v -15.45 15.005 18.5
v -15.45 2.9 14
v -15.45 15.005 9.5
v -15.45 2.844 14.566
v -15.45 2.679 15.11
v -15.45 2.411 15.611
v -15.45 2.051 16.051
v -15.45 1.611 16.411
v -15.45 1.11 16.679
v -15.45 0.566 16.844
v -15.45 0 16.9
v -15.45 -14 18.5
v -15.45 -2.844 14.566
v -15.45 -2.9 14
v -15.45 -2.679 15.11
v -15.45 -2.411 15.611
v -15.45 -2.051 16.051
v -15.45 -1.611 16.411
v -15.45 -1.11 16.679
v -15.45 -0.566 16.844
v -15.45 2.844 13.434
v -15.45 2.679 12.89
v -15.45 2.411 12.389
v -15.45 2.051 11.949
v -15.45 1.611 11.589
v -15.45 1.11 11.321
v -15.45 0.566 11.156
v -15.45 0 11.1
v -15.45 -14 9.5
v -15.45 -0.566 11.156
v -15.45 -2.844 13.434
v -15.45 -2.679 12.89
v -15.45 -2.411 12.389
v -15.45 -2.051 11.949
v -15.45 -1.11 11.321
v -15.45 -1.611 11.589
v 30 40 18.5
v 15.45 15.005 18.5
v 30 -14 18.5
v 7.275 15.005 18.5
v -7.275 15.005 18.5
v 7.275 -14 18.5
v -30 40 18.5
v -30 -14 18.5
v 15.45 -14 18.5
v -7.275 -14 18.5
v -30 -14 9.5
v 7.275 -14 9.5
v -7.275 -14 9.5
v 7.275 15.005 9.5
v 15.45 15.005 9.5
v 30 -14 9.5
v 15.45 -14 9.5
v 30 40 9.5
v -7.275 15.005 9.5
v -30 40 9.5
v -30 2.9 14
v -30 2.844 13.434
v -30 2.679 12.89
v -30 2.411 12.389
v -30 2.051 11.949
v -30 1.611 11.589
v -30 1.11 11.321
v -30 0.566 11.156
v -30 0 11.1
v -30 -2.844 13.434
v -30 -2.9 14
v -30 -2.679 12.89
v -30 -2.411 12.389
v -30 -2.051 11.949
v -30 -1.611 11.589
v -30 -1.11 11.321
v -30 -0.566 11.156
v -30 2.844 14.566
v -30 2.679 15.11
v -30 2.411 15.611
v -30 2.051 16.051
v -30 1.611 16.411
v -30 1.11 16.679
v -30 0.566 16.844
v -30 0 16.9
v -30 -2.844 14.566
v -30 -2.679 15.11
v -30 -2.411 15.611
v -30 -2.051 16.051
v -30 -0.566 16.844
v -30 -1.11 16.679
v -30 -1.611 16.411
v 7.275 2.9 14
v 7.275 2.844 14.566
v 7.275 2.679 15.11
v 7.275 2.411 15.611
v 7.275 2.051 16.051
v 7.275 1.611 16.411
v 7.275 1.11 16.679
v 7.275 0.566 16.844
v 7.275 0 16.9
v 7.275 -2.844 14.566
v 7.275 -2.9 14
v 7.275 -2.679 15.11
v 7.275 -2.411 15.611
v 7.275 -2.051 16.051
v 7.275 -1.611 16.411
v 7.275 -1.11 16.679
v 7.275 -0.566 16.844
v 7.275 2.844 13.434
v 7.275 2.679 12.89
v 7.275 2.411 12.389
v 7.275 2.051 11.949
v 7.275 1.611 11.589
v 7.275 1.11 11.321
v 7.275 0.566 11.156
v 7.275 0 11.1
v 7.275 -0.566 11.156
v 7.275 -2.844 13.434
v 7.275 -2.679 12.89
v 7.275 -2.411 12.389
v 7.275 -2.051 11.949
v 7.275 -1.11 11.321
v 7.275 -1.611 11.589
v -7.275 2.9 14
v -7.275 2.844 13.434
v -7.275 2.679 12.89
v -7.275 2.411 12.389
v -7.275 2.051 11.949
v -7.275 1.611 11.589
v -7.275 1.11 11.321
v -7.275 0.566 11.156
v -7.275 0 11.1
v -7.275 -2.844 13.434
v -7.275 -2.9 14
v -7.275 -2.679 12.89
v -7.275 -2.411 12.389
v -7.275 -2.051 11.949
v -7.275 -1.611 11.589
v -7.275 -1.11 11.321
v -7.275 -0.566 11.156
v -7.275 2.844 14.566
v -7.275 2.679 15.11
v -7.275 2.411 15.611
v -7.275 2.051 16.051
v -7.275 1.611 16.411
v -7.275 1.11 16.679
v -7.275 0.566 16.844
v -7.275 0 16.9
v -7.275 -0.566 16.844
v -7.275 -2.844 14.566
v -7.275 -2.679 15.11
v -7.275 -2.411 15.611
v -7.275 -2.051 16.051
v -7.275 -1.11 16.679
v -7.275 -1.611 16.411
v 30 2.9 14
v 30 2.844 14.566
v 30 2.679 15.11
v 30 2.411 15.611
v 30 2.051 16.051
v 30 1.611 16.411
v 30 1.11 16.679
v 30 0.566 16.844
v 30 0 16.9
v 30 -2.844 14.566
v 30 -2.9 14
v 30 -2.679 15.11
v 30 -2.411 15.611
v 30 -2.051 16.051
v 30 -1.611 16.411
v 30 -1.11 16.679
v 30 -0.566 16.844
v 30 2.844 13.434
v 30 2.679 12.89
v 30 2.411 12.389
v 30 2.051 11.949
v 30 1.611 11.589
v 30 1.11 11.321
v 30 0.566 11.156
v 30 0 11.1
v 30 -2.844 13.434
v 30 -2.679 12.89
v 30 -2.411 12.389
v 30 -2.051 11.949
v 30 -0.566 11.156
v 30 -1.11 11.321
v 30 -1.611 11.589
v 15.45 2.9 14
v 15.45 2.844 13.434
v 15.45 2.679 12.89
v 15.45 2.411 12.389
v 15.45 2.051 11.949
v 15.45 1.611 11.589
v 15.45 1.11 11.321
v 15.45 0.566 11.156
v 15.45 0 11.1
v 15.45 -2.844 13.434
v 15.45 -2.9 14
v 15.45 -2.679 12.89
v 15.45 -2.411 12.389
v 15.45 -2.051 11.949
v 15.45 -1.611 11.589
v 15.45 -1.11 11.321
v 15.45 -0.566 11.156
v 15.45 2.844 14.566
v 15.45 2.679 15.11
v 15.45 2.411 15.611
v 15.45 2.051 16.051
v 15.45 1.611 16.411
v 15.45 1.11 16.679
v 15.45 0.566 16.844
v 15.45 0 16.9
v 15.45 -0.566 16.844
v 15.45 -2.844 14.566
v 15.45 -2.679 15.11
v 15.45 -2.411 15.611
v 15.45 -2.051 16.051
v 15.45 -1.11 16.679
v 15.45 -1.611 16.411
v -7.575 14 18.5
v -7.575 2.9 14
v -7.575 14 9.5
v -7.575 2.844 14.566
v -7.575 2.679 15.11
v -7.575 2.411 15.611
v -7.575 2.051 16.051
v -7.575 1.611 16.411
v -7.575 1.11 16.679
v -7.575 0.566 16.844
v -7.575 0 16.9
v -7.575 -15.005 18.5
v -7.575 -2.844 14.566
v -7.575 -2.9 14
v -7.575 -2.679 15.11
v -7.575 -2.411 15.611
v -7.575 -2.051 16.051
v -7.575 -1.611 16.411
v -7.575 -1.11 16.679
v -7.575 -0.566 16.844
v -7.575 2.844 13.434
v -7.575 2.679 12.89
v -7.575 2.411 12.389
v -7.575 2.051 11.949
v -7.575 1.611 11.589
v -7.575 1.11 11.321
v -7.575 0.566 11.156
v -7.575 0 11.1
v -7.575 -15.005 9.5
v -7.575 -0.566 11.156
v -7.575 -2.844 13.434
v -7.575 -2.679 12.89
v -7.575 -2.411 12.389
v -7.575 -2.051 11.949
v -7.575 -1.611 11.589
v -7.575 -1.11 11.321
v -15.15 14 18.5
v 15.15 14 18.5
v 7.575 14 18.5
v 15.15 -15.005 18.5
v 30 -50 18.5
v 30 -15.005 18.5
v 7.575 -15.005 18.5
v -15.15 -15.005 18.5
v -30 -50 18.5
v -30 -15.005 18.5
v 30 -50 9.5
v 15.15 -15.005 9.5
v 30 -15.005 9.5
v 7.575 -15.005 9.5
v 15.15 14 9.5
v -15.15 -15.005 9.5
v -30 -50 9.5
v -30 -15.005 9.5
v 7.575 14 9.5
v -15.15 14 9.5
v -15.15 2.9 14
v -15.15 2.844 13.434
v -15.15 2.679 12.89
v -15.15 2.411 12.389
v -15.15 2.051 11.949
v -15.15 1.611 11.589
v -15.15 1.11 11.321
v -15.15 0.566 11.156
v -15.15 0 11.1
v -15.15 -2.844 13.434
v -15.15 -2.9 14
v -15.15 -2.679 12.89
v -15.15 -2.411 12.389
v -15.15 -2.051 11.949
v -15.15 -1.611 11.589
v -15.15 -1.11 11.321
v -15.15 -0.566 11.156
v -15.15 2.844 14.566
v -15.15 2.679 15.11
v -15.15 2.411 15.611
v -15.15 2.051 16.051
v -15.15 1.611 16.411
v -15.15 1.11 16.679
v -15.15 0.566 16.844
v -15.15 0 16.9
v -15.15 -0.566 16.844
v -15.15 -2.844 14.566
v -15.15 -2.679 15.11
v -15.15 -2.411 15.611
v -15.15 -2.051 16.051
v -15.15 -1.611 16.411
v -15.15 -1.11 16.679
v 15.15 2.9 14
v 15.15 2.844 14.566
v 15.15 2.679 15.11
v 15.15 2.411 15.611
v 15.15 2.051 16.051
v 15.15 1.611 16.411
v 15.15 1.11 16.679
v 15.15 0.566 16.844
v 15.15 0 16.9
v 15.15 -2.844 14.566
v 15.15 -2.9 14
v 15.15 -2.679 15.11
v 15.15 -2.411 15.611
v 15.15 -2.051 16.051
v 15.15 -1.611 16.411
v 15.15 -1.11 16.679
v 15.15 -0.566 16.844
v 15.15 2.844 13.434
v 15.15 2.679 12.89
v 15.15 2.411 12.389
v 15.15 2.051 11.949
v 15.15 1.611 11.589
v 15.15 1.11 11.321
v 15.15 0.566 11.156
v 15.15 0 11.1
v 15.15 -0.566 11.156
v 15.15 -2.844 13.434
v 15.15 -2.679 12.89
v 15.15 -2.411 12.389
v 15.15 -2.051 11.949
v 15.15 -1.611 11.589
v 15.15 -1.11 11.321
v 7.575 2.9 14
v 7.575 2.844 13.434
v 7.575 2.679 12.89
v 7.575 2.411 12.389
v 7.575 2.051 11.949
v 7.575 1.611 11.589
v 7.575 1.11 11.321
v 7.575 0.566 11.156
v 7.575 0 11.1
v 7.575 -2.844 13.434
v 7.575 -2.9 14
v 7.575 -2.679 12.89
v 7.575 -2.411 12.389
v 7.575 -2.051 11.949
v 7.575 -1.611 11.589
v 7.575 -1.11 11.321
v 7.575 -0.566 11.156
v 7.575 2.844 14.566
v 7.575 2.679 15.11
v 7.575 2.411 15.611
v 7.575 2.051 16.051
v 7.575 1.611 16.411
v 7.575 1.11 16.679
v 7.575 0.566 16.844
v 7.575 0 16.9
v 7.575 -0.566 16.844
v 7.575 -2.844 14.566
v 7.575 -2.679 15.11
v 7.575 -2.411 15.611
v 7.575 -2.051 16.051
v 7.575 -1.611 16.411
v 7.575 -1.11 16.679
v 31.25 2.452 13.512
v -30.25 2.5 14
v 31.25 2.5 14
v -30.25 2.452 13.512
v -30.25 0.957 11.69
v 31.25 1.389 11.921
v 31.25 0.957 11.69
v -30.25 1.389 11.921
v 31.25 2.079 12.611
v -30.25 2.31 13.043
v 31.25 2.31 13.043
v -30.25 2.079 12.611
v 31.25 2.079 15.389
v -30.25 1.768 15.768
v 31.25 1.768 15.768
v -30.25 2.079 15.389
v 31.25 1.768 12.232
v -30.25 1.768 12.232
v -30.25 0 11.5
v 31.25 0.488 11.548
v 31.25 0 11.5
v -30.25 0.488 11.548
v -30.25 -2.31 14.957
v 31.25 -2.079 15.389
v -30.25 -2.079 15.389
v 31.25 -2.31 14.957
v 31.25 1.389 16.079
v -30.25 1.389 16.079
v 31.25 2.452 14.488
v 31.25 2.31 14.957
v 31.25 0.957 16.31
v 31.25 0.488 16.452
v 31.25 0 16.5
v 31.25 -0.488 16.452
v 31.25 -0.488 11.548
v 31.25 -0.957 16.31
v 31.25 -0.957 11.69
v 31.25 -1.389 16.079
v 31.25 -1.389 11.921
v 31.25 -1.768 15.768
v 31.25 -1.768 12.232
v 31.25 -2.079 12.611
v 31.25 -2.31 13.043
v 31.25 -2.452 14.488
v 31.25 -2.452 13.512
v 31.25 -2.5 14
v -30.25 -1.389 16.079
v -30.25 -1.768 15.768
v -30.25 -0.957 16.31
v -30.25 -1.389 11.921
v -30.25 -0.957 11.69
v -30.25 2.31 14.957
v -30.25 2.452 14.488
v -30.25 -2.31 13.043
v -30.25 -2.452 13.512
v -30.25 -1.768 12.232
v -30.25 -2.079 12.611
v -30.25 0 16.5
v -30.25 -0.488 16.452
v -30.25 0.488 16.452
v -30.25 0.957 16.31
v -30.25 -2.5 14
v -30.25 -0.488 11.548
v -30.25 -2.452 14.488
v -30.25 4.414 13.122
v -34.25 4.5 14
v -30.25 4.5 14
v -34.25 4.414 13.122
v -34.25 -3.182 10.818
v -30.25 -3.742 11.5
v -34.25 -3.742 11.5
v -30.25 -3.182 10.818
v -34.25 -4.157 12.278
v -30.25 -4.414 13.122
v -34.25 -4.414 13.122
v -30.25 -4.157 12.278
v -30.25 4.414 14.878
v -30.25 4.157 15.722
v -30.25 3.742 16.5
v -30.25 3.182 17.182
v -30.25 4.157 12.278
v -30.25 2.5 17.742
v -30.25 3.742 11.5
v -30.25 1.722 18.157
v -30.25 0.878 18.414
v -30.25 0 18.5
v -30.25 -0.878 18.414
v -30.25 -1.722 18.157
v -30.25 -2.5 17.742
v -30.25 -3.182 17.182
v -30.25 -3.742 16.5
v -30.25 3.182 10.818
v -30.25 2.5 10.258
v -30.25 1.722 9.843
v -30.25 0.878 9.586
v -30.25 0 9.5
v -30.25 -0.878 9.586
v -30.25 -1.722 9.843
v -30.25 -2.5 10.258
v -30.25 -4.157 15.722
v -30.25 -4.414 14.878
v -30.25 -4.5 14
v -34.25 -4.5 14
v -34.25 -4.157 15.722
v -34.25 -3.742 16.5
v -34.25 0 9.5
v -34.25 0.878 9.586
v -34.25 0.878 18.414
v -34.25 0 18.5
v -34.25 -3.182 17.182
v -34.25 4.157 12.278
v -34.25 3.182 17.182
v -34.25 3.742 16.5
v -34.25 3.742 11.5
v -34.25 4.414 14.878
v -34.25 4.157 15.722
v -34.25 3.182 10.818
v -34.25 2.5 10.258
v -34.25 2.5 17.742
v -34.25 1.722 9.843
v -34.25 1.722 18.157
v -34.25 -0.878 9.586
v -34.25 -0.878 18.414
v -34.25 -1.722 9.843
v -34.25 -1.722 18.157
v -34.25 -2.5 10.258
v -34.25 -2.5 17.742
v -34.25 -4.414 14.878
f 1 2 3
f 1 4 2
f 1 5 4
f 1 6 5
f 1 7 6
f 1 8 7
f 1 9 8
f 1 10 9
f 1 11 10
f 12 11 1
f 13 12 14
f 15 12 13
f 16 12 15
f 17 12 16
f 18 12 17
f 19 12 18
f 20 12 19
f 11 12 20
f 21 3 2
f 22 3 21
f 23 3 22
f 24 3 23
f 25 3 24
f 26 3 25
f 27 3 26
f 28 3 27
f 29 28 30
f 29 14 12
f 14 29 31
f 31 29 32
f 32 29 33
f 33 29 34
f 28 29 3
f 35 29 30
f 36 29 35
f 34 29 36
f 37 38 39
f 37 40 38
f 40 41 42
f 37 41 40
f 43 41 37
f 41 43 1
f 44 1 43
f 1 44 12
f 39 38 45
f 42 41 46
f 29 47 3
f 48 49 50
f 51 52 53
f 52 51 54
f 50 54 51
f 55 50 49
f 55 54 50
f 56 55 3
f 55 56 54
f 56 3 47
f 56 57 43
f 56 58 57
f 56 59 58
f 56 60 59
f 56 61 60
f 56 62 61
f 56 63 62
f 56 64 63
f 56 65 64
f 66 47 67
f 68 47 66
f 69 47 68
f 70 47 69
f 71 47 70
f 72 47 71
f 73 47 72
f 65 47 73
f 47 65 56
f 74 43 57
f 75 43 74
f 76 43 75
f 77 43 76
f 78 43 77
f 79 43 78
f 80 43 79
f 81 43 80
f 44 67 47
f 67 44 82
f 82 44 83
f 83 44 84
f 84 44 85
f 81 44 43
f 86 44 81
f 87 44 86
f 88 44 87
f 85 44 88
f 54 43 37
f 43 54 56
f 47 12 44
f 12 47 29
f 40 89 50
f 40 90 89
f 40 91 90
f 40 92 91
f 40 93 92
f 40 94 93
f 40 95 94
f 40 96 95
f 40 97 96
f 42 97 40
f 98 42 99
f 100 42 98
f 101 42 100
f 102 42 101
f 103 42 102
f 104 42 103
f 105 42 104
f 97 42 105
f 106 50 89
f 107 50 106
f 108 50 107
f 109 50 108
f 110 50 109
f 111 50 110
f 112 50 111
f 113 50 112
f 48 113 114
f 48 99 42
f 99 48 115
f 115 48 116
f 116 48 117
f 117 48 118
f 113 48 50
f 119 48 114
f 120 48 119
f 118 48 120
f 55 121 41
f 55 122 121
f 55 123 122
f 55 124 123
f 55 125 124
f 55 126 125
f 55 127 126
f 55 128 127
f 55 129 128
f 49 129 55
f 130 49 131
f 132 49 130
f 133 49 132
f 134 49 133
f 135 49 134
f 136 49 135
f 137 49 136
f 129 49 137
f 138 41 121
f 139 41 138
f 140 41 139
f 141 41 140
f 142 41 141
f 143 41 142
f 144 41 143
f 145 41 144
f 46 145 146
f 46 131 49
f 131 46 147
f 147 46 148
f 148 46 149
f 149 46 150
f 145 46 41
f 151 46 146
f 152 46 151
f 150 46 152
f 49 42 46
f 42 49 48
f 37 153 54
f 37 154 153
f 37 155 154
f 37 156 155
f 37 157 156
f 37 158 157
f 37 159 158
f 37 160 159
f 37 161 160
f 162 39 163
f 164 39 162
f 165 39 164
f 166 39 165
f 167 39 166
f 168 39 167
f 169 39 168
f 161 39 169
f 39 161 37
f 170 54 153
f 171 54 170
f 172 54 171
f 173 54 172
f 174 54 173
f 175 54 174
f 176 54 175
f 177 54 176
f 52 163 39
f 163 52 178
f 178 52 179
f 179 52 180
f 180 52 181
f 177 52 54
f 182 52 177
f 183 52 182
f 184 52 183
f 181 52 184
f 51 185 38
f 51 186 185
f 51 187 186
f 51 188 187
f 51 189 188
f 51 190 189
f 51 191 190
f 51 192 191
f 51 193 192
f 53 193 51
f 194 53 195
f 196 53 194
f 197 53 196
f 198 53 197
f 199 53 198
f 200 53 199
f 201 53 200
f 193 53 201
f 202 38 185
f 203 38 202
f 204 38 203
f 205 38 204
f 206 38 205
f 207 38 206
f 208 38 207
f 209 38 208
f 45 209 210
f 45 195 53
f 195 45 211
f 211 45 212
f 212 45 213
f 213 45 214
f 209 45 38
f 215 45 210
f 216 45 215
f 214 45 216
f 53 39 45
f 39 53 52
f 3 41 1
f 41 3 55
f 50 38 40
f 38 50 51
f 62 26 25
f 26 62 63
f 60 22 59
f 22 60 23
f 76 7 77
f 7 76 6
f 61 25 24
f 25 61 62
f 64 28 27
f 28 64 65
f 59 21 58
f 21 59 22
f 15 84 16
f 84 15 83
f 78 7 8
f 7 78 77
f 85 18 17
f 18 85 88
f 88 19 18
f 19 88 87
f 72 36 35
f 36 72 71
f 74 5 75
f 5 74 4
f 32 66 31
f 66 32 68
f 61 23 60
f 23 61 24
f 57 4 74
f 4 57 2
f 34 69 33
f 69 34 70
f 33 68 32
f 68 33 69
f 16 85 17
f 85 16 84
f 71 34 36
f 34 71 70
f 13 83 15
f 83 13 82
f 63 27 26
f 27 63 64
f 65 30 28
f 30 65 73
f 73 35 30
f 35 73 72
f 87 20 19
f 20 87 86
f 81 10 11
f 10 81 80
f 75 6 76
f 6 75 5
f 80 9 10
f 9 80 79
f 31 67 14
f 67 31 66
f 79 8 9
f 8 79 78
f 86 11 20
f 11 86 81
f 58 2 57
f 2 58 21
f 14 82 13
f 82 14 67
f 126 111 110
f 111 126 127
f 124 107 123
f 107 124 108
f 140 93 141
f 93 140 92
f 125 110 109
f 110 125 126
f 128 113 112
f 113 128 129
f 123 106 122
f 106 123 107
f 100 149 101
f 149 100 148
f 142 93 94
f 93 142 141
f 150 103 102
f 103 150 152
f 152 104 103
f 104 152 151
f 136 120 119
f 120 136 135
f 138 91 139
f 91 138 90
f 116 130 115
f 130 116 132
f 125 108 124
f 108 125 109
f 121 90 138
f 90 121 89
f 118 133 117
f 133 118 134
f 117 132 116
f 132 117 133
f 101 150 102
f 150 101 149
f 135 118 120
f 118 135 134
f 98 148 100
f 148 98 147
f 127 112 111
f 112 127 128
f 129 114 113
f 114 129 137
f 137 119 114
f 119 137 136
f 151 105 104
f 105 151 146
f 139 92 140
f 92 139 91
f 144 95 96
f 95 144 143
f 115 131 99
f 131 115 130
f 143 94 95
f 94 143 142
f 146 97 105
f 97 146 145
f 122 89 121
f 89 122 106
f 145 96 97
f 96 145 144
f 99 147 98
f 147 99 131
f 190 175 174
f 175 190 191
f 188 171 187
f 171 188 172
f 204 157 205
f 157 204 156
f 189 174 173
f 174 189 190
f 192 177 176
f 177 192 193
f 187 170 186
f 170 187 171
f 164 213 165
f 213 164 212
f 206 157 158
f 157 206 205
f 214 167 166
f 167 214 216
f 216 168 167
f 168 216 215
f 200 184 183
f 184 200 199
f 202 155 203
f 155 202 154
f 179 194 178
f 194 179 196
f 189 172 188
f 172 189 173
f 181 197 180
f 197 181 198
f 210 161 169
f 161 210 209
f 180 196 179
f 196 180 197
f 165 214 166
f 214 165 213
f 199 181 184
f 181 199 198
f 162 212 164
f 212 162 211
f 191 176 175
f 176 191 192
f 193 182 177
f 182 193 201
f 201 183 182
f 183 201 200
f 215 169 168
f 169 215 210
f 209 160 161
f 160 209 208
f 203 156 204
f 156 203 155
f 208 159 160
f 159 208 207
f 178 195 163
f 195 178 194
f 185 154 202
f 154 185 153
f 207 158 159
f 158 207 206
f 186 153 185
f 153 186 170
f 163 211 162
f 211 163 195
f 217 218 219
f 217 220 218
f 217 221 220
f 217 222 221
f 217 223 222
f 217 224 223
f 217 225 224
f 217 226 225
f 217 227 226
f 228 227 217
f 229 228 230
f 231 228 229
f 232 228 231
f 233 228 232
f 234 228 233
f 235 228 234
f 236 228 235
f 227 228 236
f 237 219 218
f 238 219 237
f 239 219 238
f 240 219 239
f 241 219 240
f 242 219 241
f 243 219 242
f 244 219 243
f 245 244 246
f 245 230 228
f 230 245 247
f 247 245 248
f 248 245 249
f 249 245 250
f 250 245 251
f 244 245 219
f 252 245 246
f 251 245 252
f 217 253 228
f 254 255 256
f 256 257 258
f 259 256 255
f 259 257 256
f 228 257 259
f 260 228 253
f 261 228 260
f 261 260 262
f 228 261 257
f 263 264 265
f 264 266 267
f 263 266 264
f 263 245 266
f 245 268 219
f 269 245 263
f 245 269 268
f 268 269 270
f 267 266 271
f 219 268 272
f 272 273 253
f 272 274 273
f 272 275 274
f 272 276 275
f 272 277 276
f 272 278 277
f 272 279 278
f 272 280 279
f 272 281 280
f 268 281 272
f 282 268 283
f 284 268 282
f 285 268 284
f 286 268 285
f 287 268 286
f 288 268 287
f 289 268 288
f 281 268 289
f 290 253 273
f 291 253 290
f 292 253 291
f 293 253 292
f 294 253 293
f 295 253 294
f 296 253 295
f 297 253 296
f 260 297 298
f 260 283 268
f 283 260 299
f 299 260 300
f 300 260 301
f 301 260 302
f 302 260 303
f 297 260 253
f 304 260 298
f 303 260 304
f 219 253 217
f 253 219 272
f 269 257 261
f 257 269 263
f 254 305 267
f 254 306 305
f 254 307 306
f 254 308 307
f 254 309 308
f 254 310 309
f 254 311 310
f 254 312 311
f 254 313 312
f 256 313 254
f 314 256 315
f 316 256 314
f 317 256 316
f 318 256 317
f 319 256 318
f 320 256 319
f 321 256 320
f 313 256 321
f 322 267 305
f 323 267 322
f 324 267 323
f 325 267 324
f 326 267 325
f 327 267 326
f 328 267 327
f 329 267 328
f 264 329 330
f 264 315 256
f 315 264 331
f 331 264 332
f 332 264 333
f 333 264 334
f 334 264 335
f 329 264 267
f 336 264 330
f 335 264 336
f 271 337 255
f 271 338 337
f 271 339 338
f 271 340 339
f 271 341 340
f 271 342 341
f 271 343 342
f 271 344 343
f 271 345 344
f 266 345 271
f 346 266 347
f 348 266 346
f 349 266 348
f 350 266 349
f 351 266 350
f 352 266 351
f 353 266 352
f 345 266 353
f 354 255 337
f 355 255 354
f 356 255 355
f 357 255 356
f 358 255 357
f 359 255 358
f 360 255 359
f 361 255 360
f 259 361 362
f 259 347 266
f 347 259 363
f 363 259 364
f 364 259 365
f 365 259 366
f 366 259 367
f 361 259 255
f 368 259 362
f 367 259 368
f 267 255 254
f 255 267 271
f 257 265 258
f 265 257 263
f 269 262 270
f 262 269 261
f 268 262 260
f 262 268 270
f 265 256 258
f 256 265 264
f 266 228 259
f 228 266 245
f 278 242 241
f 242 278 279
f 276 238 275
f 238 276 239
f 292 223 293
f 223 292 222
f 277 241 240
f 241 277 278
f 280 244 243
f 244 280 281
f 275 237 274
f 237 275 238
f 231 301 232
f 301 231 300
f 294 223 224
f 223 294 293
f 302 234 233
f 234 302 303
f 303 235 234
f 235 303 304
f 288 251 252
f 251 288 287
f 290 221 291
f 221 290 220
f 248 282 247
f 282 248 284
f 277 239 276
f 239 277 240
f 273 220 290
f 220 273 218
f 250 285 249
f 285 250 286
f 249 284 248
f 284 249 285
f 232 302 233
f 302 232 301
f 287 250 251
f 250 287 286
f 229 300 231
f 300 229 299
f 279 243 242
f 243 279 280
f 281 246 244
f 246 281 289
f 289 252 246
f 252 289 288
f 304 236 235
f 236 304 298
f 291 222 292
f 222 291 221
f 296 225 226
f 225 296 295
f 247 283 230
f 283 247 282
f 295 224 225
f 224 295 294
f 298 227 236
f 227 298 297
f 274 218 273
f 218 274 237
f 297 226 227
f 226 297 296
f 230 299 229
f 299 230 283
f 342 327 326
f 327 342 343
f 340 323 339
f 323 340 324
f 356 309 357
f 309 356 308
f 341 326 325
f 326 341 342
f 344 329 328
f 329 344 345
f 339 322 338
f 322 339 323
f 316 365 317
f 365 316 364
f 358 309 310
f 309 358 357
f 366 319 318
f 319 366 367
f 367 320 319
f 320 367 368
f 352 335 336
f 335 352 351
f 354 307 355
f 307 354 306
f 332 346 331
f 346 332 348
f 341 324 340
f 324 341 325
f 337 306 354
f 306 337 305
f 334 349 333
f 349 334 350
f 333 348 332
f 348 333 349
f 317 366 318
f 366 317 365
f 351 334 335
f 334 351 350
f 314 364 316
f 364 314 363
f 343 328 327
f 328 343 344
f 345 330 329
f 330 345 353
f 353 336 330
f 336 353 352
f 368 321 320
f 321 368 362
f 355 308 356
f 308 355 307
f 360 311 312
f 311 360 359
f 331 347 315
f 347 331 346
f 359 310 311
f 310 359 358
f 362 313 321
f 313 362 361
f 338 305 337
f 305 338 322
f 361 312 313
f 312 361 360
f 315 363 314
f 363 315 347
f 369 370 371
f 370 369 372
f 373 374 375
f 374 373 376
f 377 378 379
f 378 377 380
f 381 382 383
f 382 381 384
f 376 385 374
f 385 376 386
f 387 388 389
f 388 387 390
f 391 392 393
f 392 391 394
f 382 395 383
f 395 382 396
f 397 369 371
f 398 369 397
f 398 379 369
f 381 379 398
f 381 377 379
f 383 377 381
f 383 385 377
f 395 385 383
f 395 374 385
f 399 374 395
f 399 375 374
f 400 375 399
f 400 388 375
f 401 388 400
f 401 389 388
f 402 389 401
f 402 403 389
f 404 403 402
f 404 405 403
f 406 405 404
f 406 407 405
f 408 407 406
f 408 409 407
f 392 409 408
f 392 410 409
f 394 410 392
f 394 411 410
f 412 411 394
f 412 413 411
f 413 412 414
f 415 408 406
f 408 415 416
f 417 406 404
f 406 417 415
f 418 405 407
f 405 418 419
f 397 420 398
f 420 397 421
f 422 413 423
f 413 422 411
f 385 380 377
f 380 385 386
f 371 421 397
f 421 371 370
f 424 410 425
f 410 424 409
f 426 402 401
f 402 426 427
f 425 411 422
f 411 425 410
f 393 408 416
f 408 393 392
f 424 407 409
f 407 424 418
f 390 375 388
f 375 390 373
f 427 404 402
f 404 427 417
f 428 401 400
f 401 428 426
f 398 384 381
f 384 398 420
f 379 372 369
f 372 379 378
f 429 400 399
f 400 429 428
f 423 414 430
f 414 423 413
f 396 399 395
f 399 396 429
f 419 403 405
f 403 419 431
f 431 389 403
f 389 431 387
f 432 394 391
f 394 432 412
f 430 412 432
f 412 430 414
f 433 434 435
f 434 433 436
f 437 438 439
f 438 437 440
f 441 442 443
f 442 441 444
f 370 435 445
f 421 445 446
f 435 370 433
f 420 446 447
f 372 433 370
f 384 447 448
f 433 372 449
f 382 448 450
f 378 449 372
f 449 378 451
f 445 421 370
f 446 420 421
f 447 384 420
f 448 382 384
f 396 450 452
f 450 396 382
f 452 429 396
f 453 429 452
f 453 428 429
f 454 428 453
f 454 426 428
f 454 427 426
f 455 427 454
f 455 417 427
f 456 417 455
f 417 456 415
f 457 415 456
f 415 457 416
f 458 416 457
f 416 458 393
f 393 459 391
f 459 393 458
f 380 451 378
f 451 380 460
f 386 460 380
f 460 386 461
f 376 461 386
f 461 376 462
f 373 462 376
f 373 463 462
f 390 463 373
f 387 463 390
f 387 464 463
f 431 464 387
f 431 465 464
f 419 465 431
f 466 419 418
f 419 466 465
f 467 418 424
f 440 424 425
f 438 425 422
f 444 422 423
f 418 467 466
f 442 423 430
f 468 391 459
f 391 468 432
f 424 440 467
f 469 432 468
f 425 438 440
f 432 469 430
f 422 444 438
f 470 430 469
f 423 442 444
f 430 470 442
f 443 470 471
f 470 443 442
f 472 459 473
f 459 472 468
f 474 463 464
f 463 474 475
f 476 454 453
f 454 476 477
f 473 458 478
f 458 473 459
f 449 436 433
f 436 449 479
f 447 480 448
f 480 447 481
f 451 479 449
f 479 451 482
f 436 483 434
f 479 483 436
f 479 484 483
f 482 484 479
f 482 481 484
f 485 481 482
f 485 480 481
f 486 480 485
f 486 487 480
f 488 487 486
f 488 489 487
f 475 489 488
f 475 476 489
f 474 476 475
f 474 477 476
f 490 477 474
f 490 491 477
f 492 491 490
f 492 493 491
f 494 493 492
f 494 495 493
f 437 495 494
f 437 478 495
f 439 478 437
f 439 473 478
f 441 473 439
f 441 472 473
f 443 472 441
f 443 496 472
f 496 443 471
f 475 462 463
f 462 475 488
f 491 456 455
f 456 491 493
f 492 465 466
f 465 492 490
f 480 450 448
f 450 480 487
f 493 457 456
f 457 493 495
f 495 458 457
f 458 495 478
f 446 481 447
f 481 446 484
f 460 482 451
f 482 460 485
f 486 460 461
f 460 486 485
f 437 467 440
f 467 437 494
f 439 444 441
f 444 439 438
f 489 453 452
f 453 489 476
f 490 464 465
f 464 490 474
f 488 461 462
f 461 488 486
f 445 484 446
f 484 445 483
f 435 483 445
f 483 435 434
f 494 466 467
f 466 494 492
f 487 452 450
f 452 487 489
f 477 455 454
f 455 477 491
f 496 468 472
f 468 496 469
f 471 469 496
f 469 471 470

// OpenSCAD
$fn = 32;

// ------------------------------------------------------------------------
// Butt hinge: hinge 60 mm, leaf swung 0 deg
// Every part is its own module, assembly() places every instance.
// ------------------------------------------------------------------------

// --- part 1 ---
module hinge_base() {
  difference() {
    union() {
      translate([-30, -14, -4.5]) cube([14.55, 54, 9]);
      translate([-7.275, -14, -4.5]) cube([14.55, 54, 9]);
      translate([15.45, -14, -4.5]) cube([14.55, 54, 9]);
      translate([-30, 15.005, -4.5]) cube([60, 24.995, 9]);
    }
    translate([-22.725, 0, 0]) rotate([0, 90, 0]) cylinder(h = 16.55, d = 5.8, center = true);
    translate([0, 0, 0]) rotate([0, 90, 0]) cylinder(h = 16.55, d = 5.8, center = true);
    translate([22.725, 0, 0]) rotate([0, 90, 0]) cylinder(h = 16.55, d = 5.8, center = true);
  }
}

// --- part 2 ---
module hinge_mover() {
  difference() {
    union() {
      translate([-15.15, -50, -4.5]) cube([7.575, 64, 9]);
      translate([7.575, -50, -4.5]) cube([7.575, 64, 9]);
      translate([-30, -50, -4.5]) cube([60, 34.995, 9]);
    }
    translate([-11.362, 0, 0]) rotate([0, 90, 0]) cylinder(h = 9.575, d = 5.8, center = true);
    translate([11.362, 0, 0]) rotate([0, 90, 0]) cylinder(h = 9.575, d = 5.8, center = true);
  }
}

// --- part 3 ---
module hinge_pin() {
  rotate([0, 90, 0]) cylinder(h = 62.5, d = 5, center = true);
  translate([-34.25, 0, 0]) rotate([0, 90, 0]) cylinder(h = 4, d = 9);
}

// --- assembly ---
module assembly() {
  color([0.80, 0.24, 0.20]) translate([0, 0, 14]) rotate([0, 0, 0]) hinge_base();
  color([0.20, 0.45, 0.75]) translate([0, 0, 14]) rotate([0, 0, 0]) hinge_mover();
  color([0.25, 0.62, 0.32]) translate([0, 0, 14]) rotate([0, 0, 0]) hinge_pin();
}

assembly();
